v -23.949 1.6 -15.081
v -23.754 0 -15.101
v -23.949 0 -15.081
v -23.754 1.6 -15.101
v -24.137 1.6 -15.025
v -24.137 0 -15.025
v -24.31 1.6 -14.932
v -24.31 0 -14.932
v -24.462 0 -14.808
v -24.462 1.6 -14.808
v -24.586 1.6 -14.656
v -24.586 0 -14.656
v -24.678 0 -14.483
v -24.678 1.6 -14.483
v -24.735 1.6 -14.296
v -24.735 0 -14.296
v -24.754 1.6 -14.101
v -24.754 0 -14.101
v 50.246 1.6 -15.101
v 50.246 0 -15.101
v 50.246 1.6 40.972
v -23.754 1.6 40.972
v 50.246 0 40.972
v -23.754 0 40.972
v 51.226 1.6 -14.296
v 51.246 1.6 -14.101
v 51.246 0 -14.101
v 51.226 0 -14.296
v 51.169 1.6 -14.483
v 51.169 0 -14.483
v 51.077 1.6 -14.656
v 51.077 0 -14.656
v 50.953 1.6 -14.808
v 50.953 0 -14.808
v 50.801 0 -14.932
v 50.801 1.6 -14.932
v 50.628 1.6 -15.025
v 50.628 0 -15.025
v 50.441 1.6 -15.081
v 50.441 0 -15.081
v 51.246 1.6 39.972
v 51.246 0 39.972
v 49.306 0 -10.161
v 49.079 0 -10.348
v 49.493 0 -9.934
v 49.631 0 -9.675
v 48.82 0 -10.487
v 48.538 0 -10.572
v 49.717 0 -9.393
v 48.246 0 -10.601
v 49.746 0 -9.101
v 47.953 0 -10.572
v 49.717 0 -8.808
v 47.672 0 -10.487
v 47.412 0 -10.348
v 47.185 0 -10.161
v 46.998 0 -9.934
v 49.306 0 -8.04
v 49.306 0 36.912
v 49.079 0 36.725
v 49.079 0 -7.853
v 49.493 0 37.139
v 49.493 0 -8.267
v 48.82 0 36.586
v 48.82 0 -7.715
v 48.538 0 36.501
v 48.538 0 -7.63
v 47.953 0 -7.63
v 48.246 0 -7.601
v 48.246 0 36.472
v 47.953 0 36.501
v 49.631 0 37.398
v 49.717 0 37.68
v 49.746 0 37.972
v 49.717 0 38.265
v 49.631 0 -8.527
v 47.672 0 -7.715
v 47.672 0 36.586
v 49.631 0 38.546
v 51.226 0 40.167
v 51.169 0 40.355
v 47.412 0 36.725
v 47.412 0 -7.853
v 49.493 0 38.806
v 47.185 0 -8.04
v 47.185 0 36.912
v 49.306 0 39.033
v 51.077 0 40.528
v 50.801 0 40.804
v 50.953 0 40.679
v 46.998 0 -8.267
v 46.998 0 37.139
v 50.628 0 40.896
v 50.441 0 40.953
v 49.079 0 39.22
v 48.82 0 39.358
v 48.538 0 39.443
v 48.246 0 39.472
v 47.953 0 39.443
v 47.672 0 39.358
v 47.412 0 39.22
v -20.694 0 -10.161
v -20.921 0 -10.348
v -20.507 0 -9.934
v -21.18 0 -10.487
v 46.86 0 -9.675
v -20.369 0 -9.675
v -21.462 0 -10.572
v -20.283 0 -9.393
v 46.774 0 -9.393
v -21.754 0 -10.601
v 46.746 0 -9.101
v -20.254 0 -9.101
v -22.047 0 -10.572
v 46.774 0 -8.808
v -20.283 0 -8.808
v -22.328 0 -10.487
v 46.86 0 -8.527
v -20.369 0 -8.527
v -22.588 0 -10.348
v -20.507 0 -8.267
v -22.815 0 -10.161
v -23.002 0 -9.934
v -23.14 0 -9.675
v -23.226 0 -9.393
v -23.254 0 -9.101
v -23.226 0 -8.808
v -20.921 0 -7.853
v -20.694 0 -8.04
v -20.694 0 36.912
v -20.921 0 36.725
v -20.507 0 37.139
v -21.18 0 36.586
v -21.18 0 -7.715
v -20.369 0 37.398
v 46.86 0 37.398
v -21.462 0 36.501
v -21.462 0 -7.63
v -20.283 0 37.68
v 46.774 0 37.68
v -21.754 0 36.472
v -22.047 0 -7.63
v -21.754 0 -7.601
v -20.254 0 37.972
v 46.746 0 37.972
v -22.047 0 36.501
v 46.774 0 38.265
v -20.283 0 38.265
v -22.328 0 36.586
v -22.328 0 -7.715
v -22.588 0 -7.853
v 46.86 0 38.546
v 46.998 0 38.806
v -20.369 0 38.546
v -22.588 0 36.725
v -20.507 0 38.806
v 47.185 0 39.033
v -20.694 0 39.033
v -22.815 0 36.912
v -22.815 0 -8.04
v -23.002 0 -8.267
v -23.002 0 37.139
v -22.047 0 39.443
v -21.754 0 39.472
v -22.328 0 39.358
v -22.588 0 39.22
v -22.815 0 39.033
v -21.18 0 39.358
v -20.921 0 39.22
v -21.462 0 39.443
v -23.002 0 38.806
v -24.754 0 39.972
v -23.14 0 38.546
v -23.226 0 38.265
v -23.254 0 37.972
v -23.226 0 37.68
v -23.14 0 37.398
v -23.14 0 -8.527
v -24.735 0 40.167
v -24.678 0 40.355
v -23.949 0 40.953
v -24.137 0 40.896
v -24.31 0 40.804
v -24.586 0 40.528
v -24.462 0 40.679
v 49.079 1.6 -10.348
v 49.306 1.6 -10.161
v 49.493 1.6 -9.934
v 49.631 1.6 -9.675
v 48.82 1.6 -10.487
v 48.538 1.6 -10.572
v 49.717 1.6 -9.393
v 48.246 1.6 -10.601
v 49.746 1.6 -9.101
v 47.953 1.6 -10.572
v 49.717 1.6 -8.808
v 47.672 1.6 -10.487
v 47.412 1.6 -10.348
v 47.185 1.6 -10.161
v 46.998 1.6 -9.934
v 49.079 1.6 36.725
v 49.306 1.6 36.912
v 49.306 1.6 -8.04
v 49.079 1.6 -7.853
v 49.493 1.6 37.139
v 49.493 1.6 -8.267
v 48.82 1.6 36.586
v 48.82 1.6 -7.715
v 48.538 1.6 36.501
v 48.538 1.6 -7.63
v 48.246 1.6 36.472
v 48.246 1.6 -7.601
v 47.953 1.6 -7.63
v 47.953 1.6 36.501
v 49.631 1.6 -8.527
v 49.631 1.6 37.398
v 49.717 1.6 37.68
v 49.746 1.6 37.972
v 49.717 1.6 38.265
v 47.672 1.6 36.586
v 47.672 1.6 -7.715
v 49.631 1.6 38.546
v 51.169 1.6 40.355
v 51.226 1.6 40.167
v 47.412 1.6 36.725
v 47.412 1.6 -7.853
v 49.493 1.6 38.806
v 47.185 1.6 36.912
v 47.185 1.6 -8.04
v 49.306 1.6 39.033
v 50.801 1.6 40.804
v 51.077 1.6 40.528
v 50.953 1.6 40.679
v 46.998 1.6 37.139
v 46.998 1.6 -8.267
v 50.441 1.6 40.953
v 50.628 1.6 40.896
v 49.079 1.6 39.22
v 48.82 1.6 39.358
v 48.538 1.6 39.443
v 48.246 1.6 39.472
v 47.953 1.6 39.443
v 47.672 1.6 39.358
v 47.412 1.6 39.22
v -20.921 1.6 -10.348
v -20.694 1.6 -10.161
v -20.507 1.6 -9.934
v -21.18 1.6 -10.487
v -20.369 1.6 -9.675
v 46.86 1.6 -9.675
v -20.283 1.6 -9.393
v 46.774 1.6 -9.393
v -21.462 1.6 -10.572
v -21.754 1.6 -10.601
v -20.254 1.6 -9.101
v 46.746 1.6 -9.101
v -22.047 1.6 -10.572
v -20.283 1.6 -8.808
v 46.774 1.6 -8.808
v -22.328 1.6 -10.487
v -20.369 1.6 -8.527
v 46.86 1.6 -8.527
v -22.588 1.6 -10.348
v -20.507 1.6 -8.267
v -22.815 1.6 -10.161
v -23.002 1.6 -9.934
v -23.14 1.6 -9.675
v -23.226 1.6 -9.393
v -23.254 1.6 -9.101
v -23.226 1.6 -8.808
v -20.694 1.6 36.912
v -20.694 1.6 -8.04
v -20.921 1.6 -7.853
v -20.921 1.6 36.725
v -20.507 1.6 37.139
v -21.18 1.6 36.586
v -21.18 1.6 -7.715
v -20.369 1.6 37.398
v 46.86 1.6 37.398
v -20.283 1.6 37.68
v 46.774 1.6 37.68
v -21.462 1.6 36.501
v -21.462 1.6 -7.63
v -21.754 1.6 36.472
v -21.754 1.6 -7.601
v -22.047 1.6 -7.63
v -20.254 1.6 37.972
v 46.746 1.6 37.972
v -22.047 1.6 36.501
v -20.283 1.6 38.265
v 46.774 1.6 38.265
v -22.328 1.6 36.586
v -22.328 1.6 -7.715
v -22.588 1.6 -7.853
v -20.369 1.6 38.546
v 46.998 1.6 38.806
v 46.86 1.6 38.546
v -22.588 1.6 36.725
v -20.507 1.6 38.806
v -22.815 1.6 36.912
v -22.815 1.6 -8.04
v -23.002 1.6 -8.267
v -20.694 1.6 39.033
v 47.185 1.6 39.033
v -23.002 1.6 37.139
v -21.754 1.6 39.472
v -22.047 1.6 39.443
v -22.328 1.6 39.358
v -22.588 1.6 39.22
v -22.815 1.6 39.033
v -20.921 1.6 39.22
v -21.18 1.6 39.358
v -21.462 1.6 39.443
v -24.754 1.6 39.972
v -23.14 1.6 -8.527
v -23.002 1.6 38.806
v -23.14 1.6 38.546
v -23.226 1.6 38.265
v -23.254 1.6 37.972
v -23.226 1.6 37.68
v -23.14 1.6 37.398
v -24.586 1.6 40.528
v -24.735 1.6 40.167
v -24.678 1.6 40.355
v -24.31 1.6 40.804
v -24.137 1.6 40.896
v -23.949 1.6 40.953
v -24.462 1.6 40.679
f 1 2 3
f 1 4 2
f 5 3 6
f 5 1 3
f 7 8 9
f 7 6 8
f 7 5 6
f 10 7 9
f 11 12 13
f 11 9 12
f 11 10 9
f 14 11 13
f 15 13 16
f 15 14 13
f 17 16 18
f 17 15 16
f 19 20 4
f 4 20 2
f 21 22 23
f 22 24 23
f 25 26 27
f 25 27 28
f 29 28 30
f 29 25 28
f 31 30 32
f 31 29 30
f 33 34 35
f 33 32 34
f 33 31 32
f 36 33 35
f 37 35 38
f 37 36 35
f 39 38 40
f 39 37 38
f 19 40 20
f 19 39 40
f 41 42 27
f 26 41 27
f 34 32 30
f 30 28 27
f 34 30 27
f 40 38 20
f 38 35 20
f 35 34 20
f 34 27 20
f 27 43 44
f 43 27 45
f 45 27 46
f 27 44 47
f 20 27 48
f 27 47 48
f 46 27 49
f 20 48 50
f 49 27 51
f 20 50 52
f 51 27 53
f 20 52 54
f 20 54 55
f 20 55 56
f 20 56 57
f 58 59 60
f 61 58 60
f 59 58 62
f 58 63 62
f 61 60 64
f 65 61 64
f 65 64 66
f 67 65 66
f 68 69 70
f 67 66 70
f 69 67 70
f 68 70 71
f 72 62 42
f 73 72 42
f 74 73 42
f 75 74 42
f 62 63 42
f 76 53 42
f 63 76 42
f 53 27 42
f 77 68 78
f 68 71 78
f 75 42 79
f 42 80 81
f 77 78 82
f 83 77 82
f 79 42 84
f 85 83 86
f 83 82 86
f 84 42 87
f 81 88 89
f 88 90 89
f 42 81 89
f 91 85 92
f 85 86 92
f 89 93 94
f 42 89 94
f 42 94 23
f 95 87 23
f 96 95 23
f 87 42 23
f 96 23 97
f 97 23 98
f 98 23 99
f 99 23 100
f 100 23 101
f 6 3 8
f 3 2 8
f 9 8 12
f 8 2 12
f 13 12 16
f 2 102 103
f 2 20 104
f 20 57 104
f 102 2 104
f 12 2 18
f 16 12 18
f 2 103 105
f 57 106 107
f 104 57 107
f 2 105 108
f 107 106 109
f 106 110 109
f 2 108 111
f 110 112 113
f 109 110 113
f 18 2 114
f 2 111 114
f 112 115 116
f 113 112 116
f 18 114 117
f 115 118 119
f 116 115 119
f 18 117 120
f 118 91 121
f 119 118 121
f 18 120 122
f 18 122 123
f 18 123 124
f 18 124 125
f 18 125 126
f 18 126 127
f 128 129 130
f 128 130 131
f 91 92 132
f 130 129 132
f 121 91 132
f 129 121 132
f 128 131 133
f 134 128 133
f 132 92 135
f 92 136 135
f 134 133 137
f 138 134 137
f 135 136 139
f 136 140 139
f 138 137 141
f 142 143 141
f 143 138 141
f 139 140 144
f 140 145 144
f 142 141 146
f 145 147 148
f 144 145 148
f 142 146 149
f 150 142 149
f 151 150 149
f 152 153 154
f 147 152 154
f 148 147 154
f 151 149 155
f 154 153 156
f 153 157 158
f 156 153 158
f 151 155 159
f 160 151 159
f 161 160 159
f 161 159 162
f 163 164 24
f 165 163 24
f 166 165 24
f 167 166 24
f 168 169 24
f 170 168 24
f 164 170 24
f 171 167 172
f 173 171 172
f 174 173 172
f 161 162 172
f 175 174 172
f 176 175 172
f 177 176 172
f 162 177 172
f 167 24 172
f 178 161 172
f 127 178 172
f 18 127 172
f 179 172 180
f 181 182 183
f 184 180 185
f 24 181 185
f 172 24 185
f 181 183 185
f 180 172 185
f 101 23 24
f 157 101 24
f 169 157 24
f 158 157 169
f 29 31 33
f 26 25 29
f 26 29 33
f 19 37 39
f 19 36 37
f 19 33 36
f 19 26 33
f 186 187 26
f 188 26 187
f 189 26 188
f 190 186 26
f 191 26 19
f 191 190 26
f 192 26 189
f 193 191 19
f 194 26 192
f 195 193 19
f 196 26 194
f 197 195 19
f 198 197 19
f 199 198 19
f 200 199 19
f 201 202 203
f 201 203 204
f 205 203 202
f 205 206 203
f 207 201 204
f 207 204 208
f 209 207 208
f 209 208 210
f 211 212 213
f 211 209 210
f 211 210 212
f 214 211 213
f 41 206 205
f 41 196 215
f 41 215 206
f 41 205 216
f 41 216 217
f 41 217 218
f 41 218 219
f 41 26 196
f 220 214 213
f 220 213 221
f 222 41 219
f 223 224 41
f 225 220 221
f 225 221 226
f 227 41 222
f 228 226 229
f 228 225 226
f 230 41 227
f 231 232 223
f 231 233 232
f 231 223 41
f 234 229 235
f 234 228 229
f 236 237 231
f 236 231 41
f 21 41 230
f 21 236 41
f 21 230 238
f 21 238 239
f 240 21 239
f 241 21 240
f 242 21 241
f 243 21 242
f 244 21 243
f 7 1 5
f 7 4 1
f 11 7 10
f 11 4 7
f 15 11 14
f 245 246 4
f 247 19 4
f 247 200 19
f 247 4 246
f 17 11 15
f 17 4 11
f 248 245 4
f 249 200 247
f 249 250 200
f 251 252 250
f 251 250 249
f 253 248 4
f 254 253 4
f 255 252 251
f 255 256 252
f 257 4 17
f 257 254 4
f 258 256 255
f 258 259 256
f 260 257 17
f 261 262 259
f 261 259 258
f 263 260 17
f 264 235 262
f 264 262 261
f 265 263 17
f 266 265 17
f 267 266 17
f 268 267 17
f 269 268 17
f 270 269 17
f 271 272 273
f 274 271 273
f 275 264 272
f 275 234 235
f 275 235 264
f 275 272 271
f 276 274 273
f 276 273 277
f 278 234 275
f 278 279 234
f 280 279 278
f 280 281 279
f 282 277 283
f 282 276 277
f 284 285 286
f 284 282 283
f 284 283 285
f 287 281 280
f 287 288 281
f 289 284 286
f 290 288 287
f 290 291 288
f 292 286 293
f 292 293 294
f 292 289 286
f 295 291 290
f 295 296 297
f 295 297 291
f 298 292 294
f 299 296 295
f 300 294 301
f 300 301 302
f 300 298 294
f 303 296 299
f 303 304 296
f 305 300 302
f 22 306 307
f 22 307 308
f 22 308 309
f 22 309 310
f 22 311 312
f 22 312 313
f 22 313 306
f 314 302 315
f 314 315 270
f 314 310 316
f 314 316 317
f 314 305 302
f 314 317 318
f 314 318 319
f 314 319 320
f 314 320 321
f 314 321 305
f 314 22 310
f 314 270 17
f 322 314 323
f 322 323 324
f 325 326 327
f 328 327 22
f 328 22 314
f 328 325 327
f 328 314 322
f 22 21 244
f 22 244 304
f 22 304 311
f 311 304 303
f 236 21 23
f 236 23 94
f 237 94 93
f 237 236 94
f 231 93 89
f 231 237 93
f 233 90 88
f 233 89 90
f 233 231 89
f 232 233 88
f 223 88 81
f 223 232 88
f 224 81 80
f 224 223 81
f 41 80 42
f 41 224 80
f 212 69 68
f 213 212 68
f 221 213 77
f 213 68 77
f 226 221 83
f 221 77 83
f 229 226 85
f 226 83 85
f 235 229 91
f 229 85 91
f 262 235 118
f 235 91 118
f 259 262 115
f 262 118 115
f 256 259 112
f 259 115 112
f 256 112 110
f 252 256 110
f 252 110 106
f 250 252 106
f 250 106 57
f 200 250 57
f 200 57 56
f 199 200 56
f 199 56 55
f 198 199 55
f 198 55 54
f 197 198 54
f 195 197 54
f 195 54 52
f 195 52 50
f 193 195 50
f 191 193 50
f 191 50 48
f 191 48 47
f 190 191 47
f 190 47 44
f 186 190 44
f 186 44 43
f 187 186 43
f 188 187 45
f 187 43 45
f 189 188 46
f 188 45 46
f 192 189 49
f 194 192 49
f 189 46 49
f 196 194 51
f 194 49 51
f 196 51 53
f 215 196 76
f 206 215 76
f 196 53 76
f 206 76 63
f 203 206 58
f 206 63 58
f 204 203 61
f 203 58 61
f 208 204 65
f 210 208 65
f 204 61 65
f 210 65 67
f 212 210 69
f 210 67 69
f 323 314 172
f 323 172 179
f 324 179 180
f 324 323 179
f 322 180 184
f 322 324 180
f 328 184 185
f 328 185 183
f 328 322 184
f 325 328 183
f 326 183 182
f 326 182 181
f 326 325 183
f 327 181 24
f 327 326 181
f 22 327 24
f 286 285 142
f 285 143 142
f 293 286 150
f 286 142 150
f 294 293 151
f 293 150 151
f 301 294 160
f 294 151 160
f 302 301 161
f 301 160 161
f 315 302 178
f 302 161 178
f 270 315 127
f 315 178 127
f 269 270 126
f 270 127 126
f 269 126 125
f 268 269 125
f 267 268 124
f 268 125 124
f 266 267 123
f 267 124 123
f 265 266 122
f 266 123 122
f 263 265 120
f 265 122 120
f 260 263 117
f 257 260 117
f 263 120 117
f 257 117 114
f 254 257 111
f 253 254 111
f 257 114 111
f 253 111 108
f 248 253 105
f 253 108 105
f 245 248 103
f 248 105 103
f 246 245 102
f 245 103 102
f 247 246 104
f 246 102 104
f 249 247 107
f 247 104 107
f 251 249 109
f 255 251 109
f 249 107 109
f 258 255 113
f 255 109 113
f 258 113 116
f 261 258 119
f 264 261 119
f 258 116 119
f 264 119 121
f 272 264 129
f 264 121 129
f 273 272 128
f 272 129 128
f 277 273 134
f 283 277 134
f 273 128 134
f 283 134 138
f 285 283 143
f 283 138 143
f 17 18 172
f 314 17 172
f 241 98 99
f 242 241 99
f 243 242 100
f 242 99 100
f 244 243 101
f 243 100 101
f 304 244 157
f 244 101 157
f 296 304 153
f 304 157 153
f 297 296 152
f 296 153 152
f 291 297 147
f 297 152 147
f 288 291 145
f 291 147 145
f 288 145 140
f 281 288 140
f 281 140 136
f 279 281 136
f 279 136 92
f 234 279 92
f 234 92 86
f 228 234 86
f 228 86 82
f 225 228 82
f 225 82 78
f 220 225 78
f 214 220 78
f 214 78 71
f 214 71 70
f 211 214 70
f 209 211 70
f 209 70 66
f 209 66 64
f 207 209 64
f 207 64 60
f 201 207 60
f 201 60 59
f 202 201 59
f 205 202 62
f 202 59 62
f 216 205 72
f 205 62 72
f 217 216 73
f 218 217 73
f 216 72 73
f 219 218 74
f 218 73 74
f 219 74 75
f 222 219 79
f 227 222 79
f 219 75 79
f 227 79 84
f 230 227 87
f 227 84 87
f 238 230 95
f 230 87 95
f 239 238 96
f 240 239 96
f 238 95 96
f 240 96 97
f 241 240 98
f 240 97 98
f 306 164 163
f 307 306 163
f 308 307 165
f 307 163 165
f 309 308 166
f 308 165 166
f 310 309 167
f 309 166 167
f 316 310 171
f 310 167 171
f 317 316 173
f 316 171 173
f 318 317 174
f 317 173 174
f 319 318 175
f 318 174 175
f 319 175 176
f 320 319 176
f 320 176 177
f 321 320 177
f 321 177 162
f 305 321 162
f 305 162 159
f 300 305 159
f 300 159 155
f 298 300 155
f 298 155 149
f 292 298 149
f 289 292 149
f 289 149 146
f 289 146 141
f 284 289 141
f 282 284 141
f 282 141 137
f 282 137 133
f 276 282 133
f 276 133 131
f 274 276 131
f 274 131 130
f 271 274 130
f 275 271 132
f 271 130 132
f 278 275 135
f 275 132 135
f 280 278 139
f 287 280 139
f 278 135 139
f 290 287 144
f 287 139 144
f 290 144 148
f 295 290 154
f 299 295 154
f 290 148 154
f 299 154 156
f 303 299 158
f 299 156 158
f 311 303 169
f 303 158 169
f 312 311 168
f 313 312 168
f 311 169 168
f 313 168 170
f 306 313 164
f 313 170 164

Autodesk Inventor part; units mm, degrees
ref_plane "YZ Plane" through (0, 0, 0) normal (1, 0, 0) x (0, 1, 0)
ref_plane "XZ Plane" through (0, 0, 0) normal (0, 1, 0) x (-1, 0, 0)
ref_plane "XY Plane" through (0, 0, 0) normal (0, 0, 1) x (1, 0, 0)
sketch "Szkic1" plane through (0, 0, 0) normal (0, 1, 0) x (-1, 0, 0)
  line L0 (24.7544, 40.9723) -> (-51.2456, 40.9723)
  line L1 (-51.2456, 40.9723) -> (-51.2456, -15.1007)
  line L2 (-51.2456, -15.1007) -> (24.7544, -15.1007)
  line L3 (24.7544, -15.1007) -> (24.7544, 40.9723)
  point P0 (0, 0)
  dimension "d0" = 76
  dimension "d1" = 56.073
extrude "Wyciągnięcie proste1" add sketch "Szkic1" along normal blind 1.6
fillet "Zaokrąglenie1" radius 1 4 edges at (51.2456, 0.8, -15.1007) (51.2456, 0.8, 40.9723) (-24.7544, 0.8, 40.9723) (-24.7544, 0.8, -15.1007)
sketch "Szkic2" plane through (0, 1.6, 0) normal (0, 1, 0) x (1, 0, 0)
  circle A0 centre (-21.7544, 9.1007) radius 1.6 projected
  circle A1 centre (48.2456, 9.1007) radius 1.6 projected
  circle A2 centre (-21.7544, -37.9723) radius 1.6 projected
  circle A3 centre (48.2456, -37.9723) radius 1.6 projected
  point P0 (0, 0)
hole "Otwór1" at (-21.7544, 1.6, -9.1007) at (48.2456, 1.6, -9.1007) at (-21.7544, 1.6, 37.9723) at (48.2456, 1.6, 37.9723) direction (0, -1, 0) diameter 3 end through all
properties part number "pcb_glowne"
